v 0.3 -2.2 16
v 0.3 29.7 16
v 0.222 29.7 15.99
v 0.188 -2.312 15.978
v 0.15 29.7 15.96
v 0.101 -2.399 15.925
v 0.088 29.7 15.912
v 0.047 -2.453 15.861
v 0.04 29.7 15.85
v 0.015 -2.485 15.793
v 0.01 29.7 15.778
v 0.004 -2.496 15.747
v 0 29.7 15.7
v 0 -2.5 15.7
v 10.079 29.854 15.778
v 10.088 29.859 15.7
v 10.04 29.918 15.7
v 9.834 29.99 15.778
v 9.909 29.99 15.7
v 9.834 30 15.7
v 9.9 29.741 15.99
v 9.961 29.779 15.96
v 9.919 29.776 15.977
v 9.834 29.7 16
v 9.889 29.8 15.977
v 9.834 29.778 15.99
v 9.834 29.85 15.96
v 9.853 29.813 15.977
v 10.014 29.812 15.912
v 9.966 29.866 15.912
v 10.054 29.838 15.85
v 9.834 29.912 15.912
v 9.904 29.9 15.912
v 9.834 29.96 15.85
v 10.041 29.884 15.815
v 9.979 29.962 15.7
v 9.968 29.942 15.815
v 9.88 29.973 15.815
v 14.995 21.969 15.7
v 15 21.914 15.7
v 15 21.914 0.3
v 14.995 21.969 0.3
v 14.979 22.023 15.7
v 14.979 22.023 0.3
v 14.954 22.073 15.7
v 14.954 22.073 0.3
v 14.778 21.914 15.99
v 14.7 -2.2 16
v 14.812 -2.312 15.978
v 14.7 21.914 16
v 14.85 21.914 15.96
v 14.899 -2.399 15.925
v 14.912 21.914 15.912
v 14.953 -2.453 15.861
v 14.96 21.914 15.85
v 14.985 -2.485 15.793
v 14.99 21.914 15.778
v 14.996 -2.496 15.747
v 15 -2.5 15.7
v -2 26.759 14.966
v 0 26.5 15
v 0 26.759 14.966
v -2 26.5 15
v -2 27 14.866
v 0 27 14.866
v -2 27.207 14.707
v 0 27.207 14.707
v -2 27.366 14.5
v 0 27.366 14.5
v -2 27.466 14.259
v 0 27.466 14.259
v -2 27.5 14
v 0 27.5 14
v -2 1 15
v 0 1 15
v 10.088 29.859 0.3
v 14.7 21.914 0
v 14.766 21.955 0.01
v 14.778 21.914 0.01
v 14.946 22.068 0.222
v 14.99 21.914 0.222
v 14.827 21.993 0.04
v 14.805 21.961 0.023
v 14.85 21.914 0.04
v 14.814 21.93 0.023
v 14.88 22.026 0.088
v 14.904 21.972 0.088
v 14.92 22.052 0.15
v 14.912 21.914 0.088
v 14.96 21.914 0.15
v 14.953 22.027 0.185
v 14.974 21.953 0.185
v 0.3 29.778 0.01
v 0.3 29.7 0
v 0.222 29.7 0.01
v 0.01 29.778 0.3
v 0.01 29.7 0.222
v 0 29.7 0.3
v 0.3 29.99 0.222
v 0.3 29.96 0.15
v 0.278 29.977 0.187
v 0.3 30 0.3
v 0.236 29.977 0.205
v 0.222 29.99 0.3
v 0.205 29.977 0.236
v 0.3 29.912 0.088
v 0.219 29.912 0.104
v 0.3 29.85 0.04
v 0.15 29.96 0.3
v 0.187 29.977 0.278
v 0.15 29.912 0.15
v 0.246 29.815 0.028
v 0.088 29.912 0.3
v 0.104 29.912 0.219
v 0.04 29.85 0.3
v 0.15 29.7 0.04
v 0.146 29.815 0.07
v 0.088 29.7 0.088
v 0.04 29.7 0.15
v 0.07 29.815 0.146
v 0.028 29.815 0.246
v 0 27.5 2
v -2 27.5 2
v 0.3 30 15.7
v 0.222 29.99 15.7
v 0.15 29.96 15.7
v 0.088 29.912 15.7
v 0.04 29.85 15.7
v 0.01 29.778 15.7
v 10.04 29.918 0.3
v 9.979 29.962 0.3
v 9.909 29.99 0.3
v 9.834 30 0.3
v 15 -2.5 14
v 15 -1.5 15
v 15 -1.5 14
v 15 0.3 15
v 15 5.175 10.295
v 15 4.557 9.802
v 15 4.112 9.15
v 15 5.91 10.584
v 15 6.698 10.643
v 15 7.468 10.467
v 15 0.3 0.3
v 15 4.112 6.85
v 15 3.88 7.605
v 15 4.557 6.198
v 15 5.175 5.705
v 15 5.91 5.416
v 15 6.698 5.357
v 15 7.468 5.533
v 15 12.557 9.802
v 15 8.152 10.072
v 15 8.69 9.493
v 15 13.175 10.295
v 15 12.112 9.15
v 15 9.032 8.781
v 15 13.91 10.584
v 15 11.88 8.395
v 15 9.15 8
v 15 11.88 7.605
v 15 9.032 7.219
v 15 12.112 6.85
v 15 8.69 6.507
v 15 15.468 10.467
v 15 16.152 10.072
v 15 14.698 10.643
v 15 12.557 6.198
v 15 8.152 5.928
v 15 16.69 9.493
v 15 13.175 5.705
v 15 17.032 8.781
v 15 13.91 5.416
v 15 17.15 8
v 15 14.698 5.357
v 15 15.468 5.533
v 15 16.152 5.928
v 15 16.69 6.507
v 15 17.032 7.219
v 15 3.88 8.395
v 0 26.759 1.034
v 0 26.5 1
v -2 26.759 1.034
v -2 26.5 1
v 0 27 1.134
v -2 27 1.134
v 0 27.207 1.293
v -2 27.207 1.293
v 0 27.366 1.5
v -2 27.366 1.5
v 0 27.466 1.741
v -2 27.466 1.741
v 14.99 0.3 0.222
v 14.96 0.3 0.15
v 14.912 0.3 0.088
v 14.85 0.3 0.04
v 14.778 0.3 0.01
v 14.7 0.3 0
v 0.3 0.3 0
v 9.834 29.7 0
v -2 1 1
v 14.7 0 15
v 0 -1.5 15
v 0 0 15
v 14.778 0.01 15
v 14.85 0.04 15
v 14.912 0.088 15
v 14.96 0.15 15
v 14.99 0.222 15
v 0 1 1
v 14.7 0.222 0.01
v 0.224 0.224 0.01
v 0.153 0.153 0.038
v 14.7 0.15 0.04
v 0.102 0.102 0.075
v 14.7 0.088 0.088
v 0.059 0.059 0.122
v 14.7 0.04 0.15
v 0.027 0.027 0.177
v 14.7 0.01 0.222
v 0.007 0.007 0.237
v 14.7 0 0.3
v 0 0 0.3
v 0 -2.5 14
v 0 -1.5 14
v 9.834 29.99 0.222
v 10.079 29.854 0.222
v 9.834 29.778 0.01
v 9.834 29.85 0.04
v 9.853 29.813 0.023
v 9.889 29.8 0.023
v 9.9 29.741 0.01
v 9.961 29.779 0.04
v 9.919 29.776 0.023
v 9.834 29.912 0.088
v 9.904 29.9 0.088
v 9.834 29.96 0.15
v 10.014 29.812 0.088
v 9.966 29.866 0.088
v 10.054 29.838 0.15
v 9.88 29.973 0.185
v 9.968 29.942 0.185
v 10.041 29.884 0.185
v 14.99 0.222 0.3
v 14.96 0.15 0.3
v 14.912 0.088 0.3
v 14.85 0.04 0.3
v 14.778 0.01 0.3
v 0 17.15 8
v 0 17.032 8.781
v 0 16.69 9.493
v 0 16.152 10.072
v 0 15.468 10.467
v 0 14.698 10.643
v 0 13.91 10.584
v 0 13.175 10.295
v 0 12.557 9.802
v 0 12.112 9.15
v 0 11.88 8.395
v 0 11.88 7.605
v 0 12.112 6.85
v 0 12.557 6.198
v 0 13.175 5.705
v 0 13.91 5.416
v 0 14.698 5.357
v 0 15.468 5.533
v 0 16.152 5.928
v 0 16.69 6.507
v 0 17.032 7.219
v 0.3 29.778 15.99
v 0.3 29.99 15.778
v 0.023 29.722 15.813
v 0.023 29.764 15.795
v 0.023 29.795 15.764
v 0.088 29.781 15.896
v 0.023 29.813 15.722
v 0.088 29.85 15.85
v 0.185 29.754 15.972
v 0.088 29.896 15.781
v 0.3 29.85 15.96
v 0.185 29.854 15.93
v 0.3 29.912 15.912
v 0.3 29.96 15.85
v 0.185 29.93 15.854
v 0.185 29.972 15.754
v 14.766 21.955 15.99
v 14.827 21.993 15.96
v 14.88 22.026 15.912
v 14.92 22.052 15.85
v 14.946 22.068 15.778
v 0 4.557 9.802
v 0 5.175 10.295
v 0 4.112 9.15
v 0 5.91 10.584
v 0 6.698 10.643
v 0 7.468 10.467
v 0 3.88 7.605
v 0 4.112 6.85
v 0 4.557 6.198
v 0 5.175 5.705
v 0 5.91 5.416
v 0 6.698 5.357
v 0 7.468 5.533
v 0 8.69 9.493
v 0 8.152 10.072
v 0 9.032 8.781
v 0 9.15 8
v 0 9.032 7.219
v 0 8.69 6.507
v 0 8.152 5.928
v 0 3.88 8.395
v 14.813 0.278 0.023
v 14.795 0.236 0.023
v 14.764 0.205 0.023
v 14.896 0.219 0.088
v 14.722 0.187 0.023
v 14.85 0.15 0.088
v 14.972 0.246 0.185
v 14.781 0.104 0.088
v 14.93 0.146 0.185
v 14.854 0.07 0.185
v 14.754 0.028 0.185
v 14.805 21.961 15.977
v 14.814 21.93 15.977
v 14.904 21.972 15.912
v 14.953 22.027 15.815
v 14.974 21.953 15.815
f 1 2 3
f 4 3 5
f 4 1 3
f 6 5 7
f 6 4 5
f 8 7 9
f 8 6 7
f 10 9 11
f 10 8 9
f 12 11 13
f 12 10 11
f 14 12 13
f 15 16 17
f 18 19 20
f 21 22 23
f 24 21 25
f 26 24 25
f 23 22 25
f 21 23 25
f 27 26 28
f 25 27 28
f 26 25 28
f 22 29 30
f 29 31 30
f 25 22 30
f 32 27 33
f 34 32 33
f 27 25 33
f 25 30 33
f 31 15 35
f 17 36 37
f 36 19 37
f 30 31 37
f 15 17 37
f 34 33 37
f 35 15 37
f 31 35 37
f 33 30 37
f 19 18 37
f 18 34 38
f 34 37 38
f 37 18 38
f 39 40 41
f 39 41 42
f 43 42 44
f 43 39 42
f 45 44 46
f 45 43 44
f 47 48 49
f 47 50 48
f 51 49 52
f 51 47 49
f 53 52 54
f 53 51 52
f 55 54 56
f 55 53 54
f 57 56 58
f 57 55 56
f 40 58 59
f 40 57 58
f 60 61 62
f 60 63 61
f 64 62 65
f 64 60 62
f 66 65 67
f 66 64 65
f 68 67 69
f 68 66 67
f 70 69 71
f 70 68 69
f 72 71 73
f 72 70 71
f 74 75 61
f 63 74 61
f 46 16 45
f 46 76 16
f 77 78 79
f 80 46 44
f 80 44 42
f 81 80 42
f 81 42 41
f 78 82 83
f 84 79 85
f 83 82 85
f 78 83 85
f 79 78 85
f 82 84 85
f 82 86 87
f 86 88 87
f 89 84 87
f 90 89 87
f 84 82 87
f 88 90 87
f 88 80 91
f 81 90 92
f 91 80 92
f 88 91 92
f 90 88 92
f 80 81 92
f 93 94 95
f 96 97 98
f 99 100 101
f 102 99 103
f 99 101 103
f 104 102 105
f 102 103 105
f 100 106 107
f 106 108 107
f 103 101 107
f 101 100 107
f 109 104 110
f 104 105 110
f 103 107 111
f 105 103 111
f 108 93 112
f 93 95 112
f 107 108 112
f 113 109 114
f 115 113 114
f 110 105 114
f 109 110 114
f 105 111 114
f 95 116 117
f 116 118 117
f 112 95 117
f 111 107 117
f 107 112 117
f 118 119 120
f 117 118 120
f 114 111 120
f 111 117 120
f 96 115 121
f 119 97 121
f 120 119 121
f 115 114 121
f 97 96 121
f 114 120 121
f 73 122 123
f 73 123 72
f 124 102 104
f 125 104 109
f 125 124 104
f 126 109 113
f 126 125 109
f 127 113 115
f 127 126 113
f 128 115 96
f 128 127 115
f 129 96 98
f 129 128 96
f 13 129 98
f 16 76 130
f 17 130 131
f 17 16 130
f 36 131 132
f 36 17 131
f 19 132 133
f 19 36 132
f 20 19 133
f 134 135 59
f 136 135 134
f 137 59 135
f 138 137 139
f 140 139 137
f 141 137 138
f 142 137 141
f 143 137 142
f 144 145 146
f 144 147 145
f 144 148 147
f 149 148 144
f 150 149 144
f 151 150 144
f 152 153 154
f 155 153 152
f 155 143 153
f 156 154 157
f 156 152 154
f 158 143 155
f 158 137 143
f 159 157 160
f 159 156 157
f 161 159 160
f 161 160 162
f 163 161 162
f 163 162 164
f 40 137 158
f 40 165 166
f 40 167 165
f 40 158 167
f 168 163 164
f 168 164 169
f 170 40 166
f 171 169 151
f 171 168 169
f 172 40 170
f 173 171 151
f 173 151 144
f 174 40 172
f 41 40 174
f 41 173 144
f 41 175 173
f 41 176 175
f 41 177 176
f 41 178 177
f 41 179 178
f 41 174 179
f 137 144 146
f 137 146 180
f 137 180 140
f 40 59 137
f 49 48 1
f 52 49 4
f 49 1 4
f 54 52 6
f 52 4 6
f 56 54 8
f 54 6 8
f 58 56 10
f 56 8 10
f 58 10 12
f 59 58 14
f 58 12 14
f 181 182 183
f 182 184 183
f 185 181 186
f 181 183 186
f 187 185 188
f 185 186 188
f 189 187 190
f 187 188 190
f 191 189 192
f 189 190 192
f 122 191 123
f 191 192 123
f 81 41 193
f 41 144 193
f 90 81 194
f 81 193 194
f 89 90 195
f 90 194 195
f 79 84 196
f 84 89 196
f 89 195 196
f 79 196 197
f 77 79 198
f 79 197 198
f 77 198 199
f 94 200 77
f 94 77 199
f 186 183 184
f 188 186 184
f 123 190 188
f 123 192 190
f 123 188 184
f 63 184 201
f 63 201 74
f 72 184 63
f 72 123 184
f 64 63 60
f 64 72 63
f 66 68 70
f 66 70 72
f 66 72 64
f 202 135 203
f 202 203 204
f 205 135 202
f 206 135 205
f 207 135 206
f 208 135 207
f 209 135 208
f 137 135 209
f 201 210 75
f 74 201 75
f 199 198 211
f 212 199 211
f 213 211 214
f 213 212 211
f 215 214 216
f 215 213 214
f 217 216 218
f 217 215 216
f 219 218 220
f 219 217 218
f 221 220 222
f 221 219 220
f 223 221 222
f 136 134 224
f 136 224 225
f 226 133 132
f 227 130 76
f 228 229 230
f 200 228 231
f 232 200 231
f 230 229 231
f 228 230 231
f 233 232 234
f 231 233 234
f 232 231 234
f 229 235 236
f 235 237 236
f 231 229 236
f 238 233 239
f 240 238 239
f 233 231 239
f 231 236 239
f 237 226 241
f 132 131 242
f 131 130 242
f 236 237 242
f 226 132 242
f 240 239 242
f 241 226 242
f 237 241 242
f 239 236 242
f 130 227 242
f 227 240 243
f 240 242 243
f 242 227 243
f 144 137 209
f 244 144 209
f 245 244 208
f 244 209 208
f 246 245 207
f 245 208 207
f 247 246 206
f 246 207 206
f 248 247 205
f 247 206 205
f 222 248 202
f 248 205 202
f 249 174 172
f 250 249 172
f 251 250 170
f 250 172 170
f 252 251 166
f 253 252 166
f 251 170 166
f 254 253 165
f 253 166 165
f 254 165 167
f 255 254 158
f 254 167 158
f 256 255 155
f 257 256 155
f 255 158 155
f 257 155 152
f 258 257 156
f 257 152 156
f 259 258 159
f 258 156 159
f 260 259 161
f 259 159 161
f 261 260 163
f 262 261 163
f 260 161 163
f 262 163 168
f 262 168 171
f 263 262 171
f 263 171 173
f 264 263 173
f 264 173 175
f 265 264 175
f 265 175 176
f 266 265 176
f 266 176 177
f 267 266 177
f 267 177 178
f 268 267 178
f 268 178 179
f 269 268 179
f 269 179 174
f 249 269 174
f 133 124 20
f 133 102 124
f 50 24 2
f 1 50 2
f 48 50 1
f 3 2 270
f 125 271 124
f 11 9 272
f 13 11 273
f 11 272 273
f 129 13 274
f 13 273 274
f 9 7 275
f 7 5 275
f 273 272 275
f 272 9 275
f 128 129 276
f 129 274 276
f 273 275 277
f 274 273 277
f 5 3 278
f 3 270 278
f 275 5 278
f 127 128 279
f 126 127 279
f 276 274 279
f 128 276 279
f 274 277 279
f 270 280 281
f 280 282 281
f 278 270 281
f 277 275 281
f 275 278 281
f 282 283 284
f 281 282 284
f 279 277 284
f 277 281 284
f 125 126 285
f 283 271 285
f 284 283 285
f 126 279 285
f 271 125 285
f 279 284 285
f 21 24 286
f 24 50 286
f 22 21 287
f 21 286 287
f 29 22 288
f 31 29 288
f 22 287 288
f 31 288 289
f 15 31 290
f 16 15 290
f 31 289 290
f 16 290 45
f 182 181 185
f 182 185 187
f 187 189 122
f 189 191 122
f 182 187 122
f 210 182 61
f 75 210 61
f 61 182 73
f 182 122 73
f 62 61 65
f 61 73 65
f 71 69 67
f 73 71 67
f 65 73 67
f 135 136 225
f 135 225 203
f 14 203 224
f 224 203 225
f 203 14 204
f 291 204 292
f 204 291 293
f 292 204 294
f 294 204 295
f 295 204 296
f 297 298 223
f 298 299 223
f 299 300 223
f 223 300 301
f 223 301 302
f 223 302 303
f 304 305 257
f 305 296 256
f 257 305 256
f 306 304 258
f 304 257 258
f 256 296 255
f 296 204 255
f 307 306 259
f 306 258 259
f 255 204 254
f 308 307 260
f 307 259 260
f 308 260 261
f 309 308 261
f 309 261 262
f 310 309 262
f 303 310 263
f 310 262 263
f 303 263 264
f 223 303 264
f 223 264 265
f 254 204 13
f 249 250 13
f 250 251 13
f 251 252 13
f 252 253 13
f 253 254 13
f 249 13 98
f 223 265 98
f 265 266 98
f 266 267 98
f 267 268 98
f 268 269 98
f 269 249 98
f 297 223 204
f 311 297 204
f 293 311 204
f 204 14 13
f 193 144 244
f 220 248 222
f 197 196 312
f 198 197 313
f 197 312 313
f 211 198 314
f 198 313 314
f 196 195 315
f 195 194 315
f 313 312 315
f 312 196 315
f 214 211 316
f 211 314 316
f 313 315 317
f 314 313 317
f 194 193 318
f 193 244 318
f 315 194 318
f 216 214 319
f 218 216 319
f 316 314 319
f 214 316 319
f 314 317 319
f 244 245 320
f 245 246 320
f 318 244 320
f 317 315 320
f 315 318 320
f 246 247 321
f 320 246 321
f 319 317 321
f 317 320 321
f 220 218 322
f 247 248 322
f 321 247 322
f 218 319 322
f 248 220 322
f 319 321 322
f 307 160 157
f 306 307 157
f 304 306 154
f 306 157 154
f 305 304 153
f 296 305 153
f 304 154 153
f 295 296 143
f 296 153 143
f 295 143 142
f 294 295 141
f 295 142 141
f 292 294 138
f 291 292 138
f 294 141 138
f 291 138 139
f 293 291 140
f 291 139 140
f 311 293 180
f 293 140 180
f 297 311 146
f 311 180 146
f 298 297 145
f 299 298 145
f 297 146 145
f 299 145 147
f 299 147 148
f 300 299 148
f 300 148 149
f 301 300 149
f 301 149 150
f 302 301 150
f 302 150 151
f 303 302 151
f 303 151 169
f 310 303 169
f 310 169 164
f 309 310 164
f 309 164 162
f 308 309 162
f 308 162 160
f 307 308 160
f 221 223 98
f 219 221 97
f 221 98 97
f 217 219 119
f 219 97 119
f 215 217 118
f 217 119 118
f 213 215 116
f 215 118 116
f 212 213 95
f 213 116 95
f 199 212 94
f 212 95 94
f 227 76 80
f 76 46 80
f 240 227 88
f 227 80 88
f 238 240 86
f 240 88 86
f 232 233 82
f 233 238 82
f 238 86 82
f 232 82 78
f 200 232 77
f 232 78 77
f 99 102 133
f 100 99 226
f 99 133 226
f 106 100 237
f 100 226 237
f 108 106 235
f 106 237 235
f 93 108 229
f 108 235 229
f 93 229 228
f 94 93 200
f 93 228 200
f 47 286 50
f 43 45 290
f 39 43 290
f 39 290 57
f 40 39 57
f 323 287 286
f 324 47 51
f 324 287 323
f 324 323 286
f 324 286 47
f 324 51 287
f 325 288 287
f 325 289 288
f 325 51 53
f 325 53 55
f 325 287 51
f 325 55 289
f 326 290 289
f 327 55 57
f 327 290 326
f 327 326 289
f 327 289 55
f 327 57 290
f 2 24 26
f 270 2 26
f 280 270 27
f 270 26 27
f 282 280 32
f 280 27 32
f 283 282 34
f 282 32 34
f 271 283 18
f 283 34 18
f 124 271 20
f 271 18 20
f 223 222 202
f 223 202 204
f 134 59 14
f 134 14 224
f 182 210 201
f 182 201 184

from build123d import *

# Parameters (mm, degrees)
BOSS_EXTRUDE1_DEPTH = 16
BOSS_EXTRUDE2_DEPTH = 15
SKETCH4_R           = 2.65
CUT_EXTRUDE1_DEPTH  = 38.161808352
SKETCH6_W           = 14
SKETCH6_H           = 26.5
BOSS_EXTRUDE4_DEPTH = 2
FILLET3_R           = 1
FILLET4_R           = 0.3


with BuildPart() as part:
    # Sketch1 → Boss-Extrude1 (new body)
    with BuildSketch(Plane.XY):
        Polygon((0, 0), (0, 30), (10, 30), (15, 22), (15, 0), align=None)
    extrude(amount=BOSS_EXTRUDE1_DEPTH)

    # Sketch3 → Boss-Extrude2 (add)
    with BuildSketch(Plane(origin=(15, 0, 0), x_dir=(0, 0, -1), z_dir=(1, 0, 0))):
        Polygon((-16, 0), (-16, -2.5), (-14, -2.5), (-14, -1.5), (-15, -1.5), (-15, 0), align=None)
    extrude(amount=-BOSS_EXTRUDE2_DEPTH)

    # Sketch4 → Cut-Extrude1 (cut, through all)
    with BuildSketch(Plane(origin=(15, 0, 0), x_dir=(0, 0, -1), z_dir=(1, 0, 0))):
        with Locations(Location((-8, 14.5, 0), (0, 0, 90))):
            Circle(SKETCH4_R)
        with Locations(Location((-8, 6.5, 0), (0, 0, 90))):
            Circle(SKETCH4_R)
    extrude(amount=-CUT_EXTRUDE1_DEPTH, mode=Mode.SUBTRACT)

    # Fillet4
    fillet4_edges = [part.edges().sort_by_distance(p)[0] for p in [
        (12.5, 26, 16),
        (5, 30, 16),
        (0, 13.75, 16),
        (15, 0, 7.5),
        (7.5, -2.5, 16),
        (0, 15, 0),
        (5, 30, 0),
        (12.5, 26, 0),
        (15, 11, 0),
        (7.5, 0, 0),
        (15, 9.75, 16),
        (0, 30, 8),
        (10, 30, 8),
        (15, 22, 8),
    ]]
    fillet(fillet4_edges, radius=FILLET4_R)


with BuildPart() as body_2:
    # Sketch6 → Boss-Extrude4 (new body)
    with BuildSketch(Plane.ZY):
        with Locations((8, 14.25)):
            Rectangle(SKETCH6_W, SKETCH6_H)
    extrude(amount=BOSS_EXTRUDE4_DEPTH)

    # Fillet3
    fillet3_edges = [body_2.edges().sort_by_distance(p)[0] for p in [
        (-1, 27.5, 1),
        (-1, 27.5, 15),
    ]]
    fillet(fillet3_edges, radius=FILLET3_R)


solid = Compound([part.part, body_2.part])
